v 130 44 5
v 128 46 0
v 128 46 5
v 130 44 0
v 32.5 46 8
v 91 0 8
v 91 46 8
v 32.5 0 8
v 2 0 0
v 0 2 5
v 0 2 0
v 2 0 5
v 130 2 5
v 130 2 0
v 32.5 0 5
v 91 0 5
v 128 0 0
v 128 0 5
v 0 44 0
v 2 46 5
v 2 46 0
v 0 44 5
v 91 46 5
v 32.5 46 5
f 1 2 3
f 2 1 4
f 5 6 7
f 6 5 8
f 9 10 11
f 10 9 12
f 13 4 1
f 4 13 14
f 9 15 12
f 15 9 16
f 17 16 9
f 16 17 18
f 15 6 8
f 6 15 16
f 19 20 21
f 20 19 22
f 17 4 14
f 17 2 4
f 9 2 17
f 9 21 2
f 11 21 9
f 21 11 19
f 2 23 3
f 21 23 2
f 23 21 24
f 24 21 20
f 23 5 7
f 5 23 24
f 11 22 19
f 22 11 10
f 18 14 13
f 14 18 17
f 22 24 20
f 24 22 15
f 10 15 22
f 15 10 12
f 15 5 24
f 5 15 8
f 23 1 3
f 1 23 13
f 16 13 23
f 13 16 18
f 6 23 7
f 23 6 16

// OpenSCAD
$fn = 32;

// ----------------------------------------------------------------------
// Stepped bar: centerstep, 130 x 46 x 8/5 mm
// ----------------------------------------------------------------------

// --- parameters (mm) ---
bar_l = 130;              // bar length, X
bar_w = 46;               // bar width, Y
plate_t = 8;              // thickness of the thick zone, Z
thin_t = 5;               // thickness of the thin zone
corner_c = 2;             // corner chamfer of the bar
step_cut = 3;             // material removed from the thin zone
thick_from = 32.5;        // start of the thick middle zone
thick_to = 91;            // end of the thick middle zone
depth_1 = 3;              // depth of cut 1 from the top face
depth_2 = 3;              // depth of cut 2 from the top face

profile = [[2, 0], [128, 0], [130, 2], [130, 44], [128, 46], [2, 46], [0, 44], [0, 2]];  // primary outline, 8 points, counter clockwise
void_1 = [[-1, -1], [32.5, -1], [32.5, 47], [-1, 47]];  // thin left end, 4 points
void_2 = [[91, -1], [131, -1], [131, 47], [91, 47]];  // thin right end, 4 points

// --- the one profile operation ---
difference() {
  linear_extrude(height = plate_t) polygon(points = profile);
  translate([0, 0, plate_t - depth_1])
    linear_extrude(height = depth_1 + 1) polygon(points = void_1);
  translate([0, 0, plate_t - depth_2])
    linear_extrude(height = depth_2 + 1) polygon(points = void_2);
}
